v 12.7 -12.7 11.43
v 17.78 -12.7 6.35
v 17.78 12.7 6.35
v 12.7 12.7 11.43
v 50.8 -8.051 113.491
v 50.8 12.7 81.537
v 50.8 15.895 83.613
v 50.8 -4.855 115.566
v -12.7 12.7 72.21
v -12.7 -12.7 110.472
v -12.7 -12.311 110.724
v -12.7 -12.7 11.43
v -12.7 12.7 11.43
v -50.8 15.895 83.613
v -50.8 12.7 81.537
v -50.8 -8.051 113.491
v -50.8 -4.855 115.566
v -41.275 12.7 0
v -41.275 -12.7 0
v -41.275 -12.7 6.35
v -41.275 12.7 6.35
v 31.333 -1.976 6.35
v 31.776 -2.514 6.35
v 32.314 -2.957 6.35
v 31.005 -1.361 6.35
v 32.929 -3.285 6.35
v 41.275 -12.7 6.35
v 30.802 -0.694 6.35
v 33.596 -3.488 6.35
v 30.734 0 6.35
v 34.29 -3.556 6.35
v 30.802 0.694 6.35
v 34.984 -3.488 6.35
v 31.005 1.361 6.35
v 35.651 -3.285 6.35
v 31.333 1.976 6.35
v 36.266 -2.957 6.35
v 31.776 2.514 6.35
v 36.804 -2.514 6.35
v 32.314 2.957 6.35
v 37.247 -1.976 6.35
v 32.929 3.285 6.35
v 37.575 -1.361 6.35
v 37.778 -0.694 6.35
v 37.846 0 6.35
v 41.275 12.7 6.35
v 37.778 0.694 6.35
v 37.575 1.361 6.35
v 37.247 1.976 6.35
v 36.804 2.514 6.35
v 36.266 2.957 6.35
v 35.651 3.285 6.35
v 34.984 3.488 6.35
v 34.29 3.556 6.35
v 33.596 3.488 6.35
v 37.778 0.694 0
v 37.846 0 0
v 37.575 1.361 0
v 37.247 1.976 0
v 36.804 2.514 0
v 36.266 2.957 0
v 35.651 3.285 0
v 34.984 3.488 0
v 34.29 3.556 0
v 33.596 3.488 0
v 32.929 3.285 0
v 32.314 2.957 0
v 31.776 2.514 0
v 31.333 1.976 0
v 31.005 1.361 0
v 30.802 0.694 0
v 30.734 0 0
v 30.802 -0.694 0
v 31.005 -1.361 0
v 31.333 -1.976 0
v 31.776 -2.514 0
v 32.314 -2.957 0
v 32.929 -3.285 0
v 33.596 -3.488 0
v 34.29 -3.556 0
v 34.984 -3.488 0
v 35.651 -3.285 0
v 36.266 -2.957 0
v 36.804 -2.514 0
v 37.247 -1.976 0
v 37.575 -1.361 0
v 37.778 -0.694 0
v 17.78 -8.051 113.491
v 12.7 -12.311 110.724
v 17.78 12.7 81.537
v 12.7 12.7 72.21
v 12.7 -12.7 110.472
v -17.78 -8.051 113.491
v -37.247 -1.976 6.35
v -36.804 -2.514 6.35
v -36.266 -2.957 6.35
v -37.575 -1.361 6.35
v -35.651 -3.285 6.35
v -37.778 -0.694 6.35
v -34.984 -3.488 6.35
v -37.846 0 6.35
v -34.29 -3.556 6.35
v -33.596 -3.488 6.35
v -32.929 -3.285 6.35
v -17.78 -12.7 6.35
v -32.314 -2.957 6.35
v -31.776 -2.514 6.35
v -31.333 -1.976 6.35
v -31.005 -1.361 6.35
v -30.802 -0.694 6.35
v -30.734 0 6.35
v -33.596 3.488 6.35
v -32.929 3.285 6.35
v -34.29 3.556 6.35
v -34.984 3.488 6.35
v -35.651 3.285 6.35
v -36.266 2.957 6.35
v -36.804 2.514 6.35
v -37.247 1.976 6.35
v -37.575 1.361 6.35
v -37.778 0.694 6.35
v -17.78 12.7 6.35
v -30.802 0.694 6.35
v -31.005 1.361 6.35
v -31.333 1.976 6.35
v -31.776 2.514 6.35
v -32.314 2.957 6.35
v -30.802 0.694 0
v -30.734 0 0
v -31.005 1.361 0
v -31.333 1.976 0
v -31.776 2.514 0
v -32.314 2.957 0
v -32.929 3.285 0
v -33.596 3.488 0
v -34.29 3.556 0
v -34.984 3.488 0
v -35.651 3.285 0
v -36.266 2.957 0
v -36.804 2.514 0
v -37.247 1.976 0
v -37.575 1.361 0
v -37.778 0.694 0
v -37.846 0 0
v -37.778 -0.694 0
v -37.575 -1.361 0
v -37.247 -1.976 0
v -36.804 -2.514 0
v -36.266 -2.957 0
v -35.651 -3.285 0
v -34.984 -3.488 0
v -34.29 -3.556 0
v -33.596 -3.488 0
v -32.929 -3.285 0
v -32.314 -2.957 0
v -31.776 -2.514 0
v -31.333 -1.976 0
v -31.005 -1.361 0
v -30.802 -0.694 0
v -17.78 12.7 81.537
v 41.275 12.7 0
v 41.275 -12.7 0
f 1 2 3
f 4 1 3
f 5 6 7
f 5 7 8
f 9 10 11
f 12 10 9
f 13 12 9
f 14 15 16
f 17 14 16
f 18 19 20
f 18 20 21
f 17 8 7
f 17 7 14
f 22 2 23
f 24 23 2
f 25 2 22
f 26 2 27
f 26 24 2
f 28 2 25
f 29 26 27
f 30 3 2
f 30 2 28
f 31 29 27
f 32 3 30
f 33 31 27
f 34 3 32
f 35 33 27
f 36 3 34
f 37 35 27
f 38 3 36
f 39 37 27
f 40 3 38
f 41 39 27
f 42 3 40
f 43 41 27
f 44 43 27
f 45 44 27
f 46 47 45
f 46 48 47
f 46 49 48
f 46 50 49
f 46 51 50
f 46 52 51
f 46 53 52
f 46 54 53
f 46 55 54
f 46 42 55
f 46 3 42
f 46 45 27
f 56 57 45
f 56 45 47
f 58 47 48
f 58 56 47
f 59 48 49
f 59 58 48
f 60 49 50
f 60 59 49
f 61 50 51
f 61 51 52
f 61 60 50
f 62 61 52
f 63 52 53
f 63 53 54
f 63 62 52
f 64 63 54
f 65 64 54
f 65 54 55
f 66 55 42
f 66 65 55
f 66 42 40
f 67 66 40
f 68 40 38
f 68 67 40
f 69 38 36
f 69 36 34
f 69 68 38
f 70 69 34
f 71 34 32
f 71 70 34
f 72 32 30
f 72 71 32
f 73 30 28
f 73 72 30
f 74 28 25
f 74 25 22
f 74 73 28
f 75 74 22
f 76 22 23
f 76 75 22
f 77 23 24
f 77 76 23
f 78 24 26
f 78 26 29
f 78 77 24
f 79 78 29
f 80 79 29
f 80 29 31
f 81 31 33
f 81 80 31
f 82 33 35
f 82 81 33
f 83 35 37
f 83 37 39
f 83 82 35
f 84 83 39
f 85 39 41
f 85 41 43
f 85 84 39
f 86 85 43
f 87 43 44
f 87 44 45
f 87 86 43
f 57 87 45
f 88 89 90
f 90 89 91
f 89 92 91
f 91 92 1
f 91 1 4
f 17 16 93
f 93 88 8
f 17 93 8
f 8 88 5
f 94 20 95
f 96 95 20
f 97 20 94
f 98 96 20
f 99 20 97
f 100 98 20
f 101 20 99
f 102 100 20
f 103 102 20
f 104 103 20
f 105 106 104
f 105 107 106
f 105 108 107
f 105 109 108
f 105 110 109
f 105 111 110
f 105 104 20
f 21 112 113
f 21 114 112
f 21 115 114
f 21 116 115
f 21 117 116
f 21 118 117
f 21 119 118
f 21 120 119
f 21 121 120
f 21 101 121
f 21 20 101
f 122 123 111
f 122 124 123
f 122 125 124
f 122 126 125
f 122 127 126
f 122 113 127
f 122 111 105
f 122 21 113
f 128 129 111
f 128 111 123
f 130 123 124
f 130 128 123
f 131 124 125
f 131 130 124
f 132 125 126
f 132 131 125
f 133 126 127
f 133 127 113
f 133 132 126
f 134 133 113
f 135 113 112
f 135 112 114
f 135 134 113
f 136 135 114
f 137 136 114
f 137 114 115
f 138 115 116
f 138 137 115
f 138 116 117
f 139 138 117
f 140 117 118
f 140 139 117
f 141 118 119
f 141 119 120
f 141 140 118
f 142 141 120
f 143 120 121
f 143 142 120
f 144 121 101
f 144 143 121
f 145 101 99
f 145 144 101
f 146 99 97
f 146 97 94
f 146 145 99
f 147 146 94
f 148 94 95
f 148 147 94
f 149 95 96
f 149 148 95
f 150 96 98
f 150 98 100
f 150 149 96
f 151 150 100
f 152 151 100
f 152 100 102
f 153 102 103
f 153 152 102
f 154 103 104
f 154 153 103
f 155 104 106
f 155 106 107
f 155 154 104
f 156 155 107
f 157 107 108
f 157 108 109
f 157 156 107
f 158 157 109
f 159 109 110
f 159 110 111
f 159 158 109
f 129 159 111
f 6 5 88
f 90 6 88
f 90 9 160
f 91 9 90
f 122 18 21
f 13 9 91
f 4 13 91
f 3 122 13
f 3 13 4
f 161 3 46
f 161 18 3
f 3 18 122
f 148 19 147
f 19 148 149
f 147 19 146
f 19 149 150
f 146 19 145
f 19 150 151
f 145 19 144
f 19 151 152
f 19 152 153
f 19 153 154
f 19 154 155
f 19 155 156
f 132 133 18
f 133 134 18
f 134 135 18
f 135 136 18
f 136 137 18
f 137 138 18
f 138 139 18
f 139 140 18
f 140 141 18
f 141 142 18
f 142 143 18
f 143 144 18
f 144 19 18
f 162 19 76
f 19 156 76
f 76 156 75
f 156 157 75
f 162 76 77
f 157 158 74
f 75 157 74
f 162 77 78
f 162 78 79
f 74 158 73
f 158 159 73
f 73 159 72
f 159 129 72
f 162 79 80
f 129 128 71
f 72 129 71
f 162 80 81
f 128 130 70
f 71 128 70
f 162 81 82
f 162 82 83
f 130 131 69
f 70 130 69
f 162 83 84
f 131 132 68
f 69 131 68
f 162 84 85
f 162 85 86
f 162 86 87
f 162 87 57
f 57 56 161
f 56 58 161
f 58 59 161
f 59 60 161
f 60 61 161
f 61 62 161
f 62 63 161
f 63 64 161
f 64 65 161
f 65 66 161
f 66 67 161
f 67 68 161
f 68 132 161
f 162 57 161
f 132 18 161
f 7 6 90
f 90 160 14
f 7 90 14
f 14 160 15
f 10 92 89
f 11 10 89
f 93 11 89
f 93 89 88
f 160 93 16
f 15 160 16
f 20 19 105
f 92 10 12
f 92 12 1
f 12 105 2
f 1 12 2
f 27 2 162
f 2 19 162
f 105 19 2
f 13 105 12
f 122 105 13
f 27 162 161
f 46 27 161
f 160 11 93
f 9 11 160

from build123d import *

# Parameters (mm, degrees)
F0_W     = 82.55
F0_H     = 25.4
F0_R     = 3.556
F1_DEPTH = 6.35
F2_W     = 25.4
F2_H     = 25.4
F3_DEPTH = 114.3
F5_DEPTH = 25.4
F6_W     = 38.1
F6_H     = 38.1
F6_W_2   = 25.4
F7_DEPTH = 3.81
F9_DEPTH = 25.4
F10_SIZE = 5.08


with BuildPart() as f1:
    # F0 (on Top) → F1 (new body)
    with BuildSketch(Plane.XY):
        Rectangle(F0_W, F0_H)
        with Locations((-34.29, 0)):
            Circle(F0_R, mode=Mode.SUBTRACT)
        with Locations((34.29, 0)):
            Circle(F0_R, mode=Mode.SUBTRACT)
    extrude(amount=F1_DEPTH)

    # F2 (on face) → F3 (join)
    with BuildSketch(Plane.XY.offset(6.35)):
        Rectangle(F2_W, F2_H)
    extrude(amount=F3_DEPTH)

    # F4 (on face) → F5 (cut)
    with BuildSketch(Plane.YZ.offset(12.7)):
        Polygon((12.7, 120.65), (-12.7, 120.65), (12.7, 81.5374299191), align=None)
    extrude(amount=-F5_DEPTH, mode=Mode.SUBTRACT)

    # F6 (on face) → F7 (join)
    with BuildSketch(Plane(origin=(0, 46.1768520488, 29.9875983504), x_dir=(-1, 0, 0), z_dir=(0, 0.8386705679, 0.544639035))):
        with Locations((-31.75, 80.5161269144)):
            Rectangle(F6_W, F6_H)
        with Locations((0, 80.5161269144)):
            Rectangle(F6_W_2, F6_H)
        with Locations((31.75, 80.5161269144)):
            Rectangle(F6_W, F6_H)
    extrude(amount=F7_DEPTH)

    # F8 (on face) → F9 (cut)
    with BuildSketch(Plane.YZ.offset(12.7)):
        Polygon((-12.7, 110.4715185089), (-8.0507472341, 113.4907785578), (-12.7, 120.65), align=None)
    extrude(amount=-F9_DEPTH, mode=Mode.SUBTRACT)

    # F10
    f10_edges = [f1.edges().sort_by_distance(p)[0] for p in [
        (12.7, 0, 6.35),
        (-12.7, 0, 6.35),
        (12.7, 2.324626, 97.514104),
        (-12.7, 2.324626, 97.514104),
    ]]
    chamfer(f10_edges, length=F10_SIZE)


solid = f1.part
